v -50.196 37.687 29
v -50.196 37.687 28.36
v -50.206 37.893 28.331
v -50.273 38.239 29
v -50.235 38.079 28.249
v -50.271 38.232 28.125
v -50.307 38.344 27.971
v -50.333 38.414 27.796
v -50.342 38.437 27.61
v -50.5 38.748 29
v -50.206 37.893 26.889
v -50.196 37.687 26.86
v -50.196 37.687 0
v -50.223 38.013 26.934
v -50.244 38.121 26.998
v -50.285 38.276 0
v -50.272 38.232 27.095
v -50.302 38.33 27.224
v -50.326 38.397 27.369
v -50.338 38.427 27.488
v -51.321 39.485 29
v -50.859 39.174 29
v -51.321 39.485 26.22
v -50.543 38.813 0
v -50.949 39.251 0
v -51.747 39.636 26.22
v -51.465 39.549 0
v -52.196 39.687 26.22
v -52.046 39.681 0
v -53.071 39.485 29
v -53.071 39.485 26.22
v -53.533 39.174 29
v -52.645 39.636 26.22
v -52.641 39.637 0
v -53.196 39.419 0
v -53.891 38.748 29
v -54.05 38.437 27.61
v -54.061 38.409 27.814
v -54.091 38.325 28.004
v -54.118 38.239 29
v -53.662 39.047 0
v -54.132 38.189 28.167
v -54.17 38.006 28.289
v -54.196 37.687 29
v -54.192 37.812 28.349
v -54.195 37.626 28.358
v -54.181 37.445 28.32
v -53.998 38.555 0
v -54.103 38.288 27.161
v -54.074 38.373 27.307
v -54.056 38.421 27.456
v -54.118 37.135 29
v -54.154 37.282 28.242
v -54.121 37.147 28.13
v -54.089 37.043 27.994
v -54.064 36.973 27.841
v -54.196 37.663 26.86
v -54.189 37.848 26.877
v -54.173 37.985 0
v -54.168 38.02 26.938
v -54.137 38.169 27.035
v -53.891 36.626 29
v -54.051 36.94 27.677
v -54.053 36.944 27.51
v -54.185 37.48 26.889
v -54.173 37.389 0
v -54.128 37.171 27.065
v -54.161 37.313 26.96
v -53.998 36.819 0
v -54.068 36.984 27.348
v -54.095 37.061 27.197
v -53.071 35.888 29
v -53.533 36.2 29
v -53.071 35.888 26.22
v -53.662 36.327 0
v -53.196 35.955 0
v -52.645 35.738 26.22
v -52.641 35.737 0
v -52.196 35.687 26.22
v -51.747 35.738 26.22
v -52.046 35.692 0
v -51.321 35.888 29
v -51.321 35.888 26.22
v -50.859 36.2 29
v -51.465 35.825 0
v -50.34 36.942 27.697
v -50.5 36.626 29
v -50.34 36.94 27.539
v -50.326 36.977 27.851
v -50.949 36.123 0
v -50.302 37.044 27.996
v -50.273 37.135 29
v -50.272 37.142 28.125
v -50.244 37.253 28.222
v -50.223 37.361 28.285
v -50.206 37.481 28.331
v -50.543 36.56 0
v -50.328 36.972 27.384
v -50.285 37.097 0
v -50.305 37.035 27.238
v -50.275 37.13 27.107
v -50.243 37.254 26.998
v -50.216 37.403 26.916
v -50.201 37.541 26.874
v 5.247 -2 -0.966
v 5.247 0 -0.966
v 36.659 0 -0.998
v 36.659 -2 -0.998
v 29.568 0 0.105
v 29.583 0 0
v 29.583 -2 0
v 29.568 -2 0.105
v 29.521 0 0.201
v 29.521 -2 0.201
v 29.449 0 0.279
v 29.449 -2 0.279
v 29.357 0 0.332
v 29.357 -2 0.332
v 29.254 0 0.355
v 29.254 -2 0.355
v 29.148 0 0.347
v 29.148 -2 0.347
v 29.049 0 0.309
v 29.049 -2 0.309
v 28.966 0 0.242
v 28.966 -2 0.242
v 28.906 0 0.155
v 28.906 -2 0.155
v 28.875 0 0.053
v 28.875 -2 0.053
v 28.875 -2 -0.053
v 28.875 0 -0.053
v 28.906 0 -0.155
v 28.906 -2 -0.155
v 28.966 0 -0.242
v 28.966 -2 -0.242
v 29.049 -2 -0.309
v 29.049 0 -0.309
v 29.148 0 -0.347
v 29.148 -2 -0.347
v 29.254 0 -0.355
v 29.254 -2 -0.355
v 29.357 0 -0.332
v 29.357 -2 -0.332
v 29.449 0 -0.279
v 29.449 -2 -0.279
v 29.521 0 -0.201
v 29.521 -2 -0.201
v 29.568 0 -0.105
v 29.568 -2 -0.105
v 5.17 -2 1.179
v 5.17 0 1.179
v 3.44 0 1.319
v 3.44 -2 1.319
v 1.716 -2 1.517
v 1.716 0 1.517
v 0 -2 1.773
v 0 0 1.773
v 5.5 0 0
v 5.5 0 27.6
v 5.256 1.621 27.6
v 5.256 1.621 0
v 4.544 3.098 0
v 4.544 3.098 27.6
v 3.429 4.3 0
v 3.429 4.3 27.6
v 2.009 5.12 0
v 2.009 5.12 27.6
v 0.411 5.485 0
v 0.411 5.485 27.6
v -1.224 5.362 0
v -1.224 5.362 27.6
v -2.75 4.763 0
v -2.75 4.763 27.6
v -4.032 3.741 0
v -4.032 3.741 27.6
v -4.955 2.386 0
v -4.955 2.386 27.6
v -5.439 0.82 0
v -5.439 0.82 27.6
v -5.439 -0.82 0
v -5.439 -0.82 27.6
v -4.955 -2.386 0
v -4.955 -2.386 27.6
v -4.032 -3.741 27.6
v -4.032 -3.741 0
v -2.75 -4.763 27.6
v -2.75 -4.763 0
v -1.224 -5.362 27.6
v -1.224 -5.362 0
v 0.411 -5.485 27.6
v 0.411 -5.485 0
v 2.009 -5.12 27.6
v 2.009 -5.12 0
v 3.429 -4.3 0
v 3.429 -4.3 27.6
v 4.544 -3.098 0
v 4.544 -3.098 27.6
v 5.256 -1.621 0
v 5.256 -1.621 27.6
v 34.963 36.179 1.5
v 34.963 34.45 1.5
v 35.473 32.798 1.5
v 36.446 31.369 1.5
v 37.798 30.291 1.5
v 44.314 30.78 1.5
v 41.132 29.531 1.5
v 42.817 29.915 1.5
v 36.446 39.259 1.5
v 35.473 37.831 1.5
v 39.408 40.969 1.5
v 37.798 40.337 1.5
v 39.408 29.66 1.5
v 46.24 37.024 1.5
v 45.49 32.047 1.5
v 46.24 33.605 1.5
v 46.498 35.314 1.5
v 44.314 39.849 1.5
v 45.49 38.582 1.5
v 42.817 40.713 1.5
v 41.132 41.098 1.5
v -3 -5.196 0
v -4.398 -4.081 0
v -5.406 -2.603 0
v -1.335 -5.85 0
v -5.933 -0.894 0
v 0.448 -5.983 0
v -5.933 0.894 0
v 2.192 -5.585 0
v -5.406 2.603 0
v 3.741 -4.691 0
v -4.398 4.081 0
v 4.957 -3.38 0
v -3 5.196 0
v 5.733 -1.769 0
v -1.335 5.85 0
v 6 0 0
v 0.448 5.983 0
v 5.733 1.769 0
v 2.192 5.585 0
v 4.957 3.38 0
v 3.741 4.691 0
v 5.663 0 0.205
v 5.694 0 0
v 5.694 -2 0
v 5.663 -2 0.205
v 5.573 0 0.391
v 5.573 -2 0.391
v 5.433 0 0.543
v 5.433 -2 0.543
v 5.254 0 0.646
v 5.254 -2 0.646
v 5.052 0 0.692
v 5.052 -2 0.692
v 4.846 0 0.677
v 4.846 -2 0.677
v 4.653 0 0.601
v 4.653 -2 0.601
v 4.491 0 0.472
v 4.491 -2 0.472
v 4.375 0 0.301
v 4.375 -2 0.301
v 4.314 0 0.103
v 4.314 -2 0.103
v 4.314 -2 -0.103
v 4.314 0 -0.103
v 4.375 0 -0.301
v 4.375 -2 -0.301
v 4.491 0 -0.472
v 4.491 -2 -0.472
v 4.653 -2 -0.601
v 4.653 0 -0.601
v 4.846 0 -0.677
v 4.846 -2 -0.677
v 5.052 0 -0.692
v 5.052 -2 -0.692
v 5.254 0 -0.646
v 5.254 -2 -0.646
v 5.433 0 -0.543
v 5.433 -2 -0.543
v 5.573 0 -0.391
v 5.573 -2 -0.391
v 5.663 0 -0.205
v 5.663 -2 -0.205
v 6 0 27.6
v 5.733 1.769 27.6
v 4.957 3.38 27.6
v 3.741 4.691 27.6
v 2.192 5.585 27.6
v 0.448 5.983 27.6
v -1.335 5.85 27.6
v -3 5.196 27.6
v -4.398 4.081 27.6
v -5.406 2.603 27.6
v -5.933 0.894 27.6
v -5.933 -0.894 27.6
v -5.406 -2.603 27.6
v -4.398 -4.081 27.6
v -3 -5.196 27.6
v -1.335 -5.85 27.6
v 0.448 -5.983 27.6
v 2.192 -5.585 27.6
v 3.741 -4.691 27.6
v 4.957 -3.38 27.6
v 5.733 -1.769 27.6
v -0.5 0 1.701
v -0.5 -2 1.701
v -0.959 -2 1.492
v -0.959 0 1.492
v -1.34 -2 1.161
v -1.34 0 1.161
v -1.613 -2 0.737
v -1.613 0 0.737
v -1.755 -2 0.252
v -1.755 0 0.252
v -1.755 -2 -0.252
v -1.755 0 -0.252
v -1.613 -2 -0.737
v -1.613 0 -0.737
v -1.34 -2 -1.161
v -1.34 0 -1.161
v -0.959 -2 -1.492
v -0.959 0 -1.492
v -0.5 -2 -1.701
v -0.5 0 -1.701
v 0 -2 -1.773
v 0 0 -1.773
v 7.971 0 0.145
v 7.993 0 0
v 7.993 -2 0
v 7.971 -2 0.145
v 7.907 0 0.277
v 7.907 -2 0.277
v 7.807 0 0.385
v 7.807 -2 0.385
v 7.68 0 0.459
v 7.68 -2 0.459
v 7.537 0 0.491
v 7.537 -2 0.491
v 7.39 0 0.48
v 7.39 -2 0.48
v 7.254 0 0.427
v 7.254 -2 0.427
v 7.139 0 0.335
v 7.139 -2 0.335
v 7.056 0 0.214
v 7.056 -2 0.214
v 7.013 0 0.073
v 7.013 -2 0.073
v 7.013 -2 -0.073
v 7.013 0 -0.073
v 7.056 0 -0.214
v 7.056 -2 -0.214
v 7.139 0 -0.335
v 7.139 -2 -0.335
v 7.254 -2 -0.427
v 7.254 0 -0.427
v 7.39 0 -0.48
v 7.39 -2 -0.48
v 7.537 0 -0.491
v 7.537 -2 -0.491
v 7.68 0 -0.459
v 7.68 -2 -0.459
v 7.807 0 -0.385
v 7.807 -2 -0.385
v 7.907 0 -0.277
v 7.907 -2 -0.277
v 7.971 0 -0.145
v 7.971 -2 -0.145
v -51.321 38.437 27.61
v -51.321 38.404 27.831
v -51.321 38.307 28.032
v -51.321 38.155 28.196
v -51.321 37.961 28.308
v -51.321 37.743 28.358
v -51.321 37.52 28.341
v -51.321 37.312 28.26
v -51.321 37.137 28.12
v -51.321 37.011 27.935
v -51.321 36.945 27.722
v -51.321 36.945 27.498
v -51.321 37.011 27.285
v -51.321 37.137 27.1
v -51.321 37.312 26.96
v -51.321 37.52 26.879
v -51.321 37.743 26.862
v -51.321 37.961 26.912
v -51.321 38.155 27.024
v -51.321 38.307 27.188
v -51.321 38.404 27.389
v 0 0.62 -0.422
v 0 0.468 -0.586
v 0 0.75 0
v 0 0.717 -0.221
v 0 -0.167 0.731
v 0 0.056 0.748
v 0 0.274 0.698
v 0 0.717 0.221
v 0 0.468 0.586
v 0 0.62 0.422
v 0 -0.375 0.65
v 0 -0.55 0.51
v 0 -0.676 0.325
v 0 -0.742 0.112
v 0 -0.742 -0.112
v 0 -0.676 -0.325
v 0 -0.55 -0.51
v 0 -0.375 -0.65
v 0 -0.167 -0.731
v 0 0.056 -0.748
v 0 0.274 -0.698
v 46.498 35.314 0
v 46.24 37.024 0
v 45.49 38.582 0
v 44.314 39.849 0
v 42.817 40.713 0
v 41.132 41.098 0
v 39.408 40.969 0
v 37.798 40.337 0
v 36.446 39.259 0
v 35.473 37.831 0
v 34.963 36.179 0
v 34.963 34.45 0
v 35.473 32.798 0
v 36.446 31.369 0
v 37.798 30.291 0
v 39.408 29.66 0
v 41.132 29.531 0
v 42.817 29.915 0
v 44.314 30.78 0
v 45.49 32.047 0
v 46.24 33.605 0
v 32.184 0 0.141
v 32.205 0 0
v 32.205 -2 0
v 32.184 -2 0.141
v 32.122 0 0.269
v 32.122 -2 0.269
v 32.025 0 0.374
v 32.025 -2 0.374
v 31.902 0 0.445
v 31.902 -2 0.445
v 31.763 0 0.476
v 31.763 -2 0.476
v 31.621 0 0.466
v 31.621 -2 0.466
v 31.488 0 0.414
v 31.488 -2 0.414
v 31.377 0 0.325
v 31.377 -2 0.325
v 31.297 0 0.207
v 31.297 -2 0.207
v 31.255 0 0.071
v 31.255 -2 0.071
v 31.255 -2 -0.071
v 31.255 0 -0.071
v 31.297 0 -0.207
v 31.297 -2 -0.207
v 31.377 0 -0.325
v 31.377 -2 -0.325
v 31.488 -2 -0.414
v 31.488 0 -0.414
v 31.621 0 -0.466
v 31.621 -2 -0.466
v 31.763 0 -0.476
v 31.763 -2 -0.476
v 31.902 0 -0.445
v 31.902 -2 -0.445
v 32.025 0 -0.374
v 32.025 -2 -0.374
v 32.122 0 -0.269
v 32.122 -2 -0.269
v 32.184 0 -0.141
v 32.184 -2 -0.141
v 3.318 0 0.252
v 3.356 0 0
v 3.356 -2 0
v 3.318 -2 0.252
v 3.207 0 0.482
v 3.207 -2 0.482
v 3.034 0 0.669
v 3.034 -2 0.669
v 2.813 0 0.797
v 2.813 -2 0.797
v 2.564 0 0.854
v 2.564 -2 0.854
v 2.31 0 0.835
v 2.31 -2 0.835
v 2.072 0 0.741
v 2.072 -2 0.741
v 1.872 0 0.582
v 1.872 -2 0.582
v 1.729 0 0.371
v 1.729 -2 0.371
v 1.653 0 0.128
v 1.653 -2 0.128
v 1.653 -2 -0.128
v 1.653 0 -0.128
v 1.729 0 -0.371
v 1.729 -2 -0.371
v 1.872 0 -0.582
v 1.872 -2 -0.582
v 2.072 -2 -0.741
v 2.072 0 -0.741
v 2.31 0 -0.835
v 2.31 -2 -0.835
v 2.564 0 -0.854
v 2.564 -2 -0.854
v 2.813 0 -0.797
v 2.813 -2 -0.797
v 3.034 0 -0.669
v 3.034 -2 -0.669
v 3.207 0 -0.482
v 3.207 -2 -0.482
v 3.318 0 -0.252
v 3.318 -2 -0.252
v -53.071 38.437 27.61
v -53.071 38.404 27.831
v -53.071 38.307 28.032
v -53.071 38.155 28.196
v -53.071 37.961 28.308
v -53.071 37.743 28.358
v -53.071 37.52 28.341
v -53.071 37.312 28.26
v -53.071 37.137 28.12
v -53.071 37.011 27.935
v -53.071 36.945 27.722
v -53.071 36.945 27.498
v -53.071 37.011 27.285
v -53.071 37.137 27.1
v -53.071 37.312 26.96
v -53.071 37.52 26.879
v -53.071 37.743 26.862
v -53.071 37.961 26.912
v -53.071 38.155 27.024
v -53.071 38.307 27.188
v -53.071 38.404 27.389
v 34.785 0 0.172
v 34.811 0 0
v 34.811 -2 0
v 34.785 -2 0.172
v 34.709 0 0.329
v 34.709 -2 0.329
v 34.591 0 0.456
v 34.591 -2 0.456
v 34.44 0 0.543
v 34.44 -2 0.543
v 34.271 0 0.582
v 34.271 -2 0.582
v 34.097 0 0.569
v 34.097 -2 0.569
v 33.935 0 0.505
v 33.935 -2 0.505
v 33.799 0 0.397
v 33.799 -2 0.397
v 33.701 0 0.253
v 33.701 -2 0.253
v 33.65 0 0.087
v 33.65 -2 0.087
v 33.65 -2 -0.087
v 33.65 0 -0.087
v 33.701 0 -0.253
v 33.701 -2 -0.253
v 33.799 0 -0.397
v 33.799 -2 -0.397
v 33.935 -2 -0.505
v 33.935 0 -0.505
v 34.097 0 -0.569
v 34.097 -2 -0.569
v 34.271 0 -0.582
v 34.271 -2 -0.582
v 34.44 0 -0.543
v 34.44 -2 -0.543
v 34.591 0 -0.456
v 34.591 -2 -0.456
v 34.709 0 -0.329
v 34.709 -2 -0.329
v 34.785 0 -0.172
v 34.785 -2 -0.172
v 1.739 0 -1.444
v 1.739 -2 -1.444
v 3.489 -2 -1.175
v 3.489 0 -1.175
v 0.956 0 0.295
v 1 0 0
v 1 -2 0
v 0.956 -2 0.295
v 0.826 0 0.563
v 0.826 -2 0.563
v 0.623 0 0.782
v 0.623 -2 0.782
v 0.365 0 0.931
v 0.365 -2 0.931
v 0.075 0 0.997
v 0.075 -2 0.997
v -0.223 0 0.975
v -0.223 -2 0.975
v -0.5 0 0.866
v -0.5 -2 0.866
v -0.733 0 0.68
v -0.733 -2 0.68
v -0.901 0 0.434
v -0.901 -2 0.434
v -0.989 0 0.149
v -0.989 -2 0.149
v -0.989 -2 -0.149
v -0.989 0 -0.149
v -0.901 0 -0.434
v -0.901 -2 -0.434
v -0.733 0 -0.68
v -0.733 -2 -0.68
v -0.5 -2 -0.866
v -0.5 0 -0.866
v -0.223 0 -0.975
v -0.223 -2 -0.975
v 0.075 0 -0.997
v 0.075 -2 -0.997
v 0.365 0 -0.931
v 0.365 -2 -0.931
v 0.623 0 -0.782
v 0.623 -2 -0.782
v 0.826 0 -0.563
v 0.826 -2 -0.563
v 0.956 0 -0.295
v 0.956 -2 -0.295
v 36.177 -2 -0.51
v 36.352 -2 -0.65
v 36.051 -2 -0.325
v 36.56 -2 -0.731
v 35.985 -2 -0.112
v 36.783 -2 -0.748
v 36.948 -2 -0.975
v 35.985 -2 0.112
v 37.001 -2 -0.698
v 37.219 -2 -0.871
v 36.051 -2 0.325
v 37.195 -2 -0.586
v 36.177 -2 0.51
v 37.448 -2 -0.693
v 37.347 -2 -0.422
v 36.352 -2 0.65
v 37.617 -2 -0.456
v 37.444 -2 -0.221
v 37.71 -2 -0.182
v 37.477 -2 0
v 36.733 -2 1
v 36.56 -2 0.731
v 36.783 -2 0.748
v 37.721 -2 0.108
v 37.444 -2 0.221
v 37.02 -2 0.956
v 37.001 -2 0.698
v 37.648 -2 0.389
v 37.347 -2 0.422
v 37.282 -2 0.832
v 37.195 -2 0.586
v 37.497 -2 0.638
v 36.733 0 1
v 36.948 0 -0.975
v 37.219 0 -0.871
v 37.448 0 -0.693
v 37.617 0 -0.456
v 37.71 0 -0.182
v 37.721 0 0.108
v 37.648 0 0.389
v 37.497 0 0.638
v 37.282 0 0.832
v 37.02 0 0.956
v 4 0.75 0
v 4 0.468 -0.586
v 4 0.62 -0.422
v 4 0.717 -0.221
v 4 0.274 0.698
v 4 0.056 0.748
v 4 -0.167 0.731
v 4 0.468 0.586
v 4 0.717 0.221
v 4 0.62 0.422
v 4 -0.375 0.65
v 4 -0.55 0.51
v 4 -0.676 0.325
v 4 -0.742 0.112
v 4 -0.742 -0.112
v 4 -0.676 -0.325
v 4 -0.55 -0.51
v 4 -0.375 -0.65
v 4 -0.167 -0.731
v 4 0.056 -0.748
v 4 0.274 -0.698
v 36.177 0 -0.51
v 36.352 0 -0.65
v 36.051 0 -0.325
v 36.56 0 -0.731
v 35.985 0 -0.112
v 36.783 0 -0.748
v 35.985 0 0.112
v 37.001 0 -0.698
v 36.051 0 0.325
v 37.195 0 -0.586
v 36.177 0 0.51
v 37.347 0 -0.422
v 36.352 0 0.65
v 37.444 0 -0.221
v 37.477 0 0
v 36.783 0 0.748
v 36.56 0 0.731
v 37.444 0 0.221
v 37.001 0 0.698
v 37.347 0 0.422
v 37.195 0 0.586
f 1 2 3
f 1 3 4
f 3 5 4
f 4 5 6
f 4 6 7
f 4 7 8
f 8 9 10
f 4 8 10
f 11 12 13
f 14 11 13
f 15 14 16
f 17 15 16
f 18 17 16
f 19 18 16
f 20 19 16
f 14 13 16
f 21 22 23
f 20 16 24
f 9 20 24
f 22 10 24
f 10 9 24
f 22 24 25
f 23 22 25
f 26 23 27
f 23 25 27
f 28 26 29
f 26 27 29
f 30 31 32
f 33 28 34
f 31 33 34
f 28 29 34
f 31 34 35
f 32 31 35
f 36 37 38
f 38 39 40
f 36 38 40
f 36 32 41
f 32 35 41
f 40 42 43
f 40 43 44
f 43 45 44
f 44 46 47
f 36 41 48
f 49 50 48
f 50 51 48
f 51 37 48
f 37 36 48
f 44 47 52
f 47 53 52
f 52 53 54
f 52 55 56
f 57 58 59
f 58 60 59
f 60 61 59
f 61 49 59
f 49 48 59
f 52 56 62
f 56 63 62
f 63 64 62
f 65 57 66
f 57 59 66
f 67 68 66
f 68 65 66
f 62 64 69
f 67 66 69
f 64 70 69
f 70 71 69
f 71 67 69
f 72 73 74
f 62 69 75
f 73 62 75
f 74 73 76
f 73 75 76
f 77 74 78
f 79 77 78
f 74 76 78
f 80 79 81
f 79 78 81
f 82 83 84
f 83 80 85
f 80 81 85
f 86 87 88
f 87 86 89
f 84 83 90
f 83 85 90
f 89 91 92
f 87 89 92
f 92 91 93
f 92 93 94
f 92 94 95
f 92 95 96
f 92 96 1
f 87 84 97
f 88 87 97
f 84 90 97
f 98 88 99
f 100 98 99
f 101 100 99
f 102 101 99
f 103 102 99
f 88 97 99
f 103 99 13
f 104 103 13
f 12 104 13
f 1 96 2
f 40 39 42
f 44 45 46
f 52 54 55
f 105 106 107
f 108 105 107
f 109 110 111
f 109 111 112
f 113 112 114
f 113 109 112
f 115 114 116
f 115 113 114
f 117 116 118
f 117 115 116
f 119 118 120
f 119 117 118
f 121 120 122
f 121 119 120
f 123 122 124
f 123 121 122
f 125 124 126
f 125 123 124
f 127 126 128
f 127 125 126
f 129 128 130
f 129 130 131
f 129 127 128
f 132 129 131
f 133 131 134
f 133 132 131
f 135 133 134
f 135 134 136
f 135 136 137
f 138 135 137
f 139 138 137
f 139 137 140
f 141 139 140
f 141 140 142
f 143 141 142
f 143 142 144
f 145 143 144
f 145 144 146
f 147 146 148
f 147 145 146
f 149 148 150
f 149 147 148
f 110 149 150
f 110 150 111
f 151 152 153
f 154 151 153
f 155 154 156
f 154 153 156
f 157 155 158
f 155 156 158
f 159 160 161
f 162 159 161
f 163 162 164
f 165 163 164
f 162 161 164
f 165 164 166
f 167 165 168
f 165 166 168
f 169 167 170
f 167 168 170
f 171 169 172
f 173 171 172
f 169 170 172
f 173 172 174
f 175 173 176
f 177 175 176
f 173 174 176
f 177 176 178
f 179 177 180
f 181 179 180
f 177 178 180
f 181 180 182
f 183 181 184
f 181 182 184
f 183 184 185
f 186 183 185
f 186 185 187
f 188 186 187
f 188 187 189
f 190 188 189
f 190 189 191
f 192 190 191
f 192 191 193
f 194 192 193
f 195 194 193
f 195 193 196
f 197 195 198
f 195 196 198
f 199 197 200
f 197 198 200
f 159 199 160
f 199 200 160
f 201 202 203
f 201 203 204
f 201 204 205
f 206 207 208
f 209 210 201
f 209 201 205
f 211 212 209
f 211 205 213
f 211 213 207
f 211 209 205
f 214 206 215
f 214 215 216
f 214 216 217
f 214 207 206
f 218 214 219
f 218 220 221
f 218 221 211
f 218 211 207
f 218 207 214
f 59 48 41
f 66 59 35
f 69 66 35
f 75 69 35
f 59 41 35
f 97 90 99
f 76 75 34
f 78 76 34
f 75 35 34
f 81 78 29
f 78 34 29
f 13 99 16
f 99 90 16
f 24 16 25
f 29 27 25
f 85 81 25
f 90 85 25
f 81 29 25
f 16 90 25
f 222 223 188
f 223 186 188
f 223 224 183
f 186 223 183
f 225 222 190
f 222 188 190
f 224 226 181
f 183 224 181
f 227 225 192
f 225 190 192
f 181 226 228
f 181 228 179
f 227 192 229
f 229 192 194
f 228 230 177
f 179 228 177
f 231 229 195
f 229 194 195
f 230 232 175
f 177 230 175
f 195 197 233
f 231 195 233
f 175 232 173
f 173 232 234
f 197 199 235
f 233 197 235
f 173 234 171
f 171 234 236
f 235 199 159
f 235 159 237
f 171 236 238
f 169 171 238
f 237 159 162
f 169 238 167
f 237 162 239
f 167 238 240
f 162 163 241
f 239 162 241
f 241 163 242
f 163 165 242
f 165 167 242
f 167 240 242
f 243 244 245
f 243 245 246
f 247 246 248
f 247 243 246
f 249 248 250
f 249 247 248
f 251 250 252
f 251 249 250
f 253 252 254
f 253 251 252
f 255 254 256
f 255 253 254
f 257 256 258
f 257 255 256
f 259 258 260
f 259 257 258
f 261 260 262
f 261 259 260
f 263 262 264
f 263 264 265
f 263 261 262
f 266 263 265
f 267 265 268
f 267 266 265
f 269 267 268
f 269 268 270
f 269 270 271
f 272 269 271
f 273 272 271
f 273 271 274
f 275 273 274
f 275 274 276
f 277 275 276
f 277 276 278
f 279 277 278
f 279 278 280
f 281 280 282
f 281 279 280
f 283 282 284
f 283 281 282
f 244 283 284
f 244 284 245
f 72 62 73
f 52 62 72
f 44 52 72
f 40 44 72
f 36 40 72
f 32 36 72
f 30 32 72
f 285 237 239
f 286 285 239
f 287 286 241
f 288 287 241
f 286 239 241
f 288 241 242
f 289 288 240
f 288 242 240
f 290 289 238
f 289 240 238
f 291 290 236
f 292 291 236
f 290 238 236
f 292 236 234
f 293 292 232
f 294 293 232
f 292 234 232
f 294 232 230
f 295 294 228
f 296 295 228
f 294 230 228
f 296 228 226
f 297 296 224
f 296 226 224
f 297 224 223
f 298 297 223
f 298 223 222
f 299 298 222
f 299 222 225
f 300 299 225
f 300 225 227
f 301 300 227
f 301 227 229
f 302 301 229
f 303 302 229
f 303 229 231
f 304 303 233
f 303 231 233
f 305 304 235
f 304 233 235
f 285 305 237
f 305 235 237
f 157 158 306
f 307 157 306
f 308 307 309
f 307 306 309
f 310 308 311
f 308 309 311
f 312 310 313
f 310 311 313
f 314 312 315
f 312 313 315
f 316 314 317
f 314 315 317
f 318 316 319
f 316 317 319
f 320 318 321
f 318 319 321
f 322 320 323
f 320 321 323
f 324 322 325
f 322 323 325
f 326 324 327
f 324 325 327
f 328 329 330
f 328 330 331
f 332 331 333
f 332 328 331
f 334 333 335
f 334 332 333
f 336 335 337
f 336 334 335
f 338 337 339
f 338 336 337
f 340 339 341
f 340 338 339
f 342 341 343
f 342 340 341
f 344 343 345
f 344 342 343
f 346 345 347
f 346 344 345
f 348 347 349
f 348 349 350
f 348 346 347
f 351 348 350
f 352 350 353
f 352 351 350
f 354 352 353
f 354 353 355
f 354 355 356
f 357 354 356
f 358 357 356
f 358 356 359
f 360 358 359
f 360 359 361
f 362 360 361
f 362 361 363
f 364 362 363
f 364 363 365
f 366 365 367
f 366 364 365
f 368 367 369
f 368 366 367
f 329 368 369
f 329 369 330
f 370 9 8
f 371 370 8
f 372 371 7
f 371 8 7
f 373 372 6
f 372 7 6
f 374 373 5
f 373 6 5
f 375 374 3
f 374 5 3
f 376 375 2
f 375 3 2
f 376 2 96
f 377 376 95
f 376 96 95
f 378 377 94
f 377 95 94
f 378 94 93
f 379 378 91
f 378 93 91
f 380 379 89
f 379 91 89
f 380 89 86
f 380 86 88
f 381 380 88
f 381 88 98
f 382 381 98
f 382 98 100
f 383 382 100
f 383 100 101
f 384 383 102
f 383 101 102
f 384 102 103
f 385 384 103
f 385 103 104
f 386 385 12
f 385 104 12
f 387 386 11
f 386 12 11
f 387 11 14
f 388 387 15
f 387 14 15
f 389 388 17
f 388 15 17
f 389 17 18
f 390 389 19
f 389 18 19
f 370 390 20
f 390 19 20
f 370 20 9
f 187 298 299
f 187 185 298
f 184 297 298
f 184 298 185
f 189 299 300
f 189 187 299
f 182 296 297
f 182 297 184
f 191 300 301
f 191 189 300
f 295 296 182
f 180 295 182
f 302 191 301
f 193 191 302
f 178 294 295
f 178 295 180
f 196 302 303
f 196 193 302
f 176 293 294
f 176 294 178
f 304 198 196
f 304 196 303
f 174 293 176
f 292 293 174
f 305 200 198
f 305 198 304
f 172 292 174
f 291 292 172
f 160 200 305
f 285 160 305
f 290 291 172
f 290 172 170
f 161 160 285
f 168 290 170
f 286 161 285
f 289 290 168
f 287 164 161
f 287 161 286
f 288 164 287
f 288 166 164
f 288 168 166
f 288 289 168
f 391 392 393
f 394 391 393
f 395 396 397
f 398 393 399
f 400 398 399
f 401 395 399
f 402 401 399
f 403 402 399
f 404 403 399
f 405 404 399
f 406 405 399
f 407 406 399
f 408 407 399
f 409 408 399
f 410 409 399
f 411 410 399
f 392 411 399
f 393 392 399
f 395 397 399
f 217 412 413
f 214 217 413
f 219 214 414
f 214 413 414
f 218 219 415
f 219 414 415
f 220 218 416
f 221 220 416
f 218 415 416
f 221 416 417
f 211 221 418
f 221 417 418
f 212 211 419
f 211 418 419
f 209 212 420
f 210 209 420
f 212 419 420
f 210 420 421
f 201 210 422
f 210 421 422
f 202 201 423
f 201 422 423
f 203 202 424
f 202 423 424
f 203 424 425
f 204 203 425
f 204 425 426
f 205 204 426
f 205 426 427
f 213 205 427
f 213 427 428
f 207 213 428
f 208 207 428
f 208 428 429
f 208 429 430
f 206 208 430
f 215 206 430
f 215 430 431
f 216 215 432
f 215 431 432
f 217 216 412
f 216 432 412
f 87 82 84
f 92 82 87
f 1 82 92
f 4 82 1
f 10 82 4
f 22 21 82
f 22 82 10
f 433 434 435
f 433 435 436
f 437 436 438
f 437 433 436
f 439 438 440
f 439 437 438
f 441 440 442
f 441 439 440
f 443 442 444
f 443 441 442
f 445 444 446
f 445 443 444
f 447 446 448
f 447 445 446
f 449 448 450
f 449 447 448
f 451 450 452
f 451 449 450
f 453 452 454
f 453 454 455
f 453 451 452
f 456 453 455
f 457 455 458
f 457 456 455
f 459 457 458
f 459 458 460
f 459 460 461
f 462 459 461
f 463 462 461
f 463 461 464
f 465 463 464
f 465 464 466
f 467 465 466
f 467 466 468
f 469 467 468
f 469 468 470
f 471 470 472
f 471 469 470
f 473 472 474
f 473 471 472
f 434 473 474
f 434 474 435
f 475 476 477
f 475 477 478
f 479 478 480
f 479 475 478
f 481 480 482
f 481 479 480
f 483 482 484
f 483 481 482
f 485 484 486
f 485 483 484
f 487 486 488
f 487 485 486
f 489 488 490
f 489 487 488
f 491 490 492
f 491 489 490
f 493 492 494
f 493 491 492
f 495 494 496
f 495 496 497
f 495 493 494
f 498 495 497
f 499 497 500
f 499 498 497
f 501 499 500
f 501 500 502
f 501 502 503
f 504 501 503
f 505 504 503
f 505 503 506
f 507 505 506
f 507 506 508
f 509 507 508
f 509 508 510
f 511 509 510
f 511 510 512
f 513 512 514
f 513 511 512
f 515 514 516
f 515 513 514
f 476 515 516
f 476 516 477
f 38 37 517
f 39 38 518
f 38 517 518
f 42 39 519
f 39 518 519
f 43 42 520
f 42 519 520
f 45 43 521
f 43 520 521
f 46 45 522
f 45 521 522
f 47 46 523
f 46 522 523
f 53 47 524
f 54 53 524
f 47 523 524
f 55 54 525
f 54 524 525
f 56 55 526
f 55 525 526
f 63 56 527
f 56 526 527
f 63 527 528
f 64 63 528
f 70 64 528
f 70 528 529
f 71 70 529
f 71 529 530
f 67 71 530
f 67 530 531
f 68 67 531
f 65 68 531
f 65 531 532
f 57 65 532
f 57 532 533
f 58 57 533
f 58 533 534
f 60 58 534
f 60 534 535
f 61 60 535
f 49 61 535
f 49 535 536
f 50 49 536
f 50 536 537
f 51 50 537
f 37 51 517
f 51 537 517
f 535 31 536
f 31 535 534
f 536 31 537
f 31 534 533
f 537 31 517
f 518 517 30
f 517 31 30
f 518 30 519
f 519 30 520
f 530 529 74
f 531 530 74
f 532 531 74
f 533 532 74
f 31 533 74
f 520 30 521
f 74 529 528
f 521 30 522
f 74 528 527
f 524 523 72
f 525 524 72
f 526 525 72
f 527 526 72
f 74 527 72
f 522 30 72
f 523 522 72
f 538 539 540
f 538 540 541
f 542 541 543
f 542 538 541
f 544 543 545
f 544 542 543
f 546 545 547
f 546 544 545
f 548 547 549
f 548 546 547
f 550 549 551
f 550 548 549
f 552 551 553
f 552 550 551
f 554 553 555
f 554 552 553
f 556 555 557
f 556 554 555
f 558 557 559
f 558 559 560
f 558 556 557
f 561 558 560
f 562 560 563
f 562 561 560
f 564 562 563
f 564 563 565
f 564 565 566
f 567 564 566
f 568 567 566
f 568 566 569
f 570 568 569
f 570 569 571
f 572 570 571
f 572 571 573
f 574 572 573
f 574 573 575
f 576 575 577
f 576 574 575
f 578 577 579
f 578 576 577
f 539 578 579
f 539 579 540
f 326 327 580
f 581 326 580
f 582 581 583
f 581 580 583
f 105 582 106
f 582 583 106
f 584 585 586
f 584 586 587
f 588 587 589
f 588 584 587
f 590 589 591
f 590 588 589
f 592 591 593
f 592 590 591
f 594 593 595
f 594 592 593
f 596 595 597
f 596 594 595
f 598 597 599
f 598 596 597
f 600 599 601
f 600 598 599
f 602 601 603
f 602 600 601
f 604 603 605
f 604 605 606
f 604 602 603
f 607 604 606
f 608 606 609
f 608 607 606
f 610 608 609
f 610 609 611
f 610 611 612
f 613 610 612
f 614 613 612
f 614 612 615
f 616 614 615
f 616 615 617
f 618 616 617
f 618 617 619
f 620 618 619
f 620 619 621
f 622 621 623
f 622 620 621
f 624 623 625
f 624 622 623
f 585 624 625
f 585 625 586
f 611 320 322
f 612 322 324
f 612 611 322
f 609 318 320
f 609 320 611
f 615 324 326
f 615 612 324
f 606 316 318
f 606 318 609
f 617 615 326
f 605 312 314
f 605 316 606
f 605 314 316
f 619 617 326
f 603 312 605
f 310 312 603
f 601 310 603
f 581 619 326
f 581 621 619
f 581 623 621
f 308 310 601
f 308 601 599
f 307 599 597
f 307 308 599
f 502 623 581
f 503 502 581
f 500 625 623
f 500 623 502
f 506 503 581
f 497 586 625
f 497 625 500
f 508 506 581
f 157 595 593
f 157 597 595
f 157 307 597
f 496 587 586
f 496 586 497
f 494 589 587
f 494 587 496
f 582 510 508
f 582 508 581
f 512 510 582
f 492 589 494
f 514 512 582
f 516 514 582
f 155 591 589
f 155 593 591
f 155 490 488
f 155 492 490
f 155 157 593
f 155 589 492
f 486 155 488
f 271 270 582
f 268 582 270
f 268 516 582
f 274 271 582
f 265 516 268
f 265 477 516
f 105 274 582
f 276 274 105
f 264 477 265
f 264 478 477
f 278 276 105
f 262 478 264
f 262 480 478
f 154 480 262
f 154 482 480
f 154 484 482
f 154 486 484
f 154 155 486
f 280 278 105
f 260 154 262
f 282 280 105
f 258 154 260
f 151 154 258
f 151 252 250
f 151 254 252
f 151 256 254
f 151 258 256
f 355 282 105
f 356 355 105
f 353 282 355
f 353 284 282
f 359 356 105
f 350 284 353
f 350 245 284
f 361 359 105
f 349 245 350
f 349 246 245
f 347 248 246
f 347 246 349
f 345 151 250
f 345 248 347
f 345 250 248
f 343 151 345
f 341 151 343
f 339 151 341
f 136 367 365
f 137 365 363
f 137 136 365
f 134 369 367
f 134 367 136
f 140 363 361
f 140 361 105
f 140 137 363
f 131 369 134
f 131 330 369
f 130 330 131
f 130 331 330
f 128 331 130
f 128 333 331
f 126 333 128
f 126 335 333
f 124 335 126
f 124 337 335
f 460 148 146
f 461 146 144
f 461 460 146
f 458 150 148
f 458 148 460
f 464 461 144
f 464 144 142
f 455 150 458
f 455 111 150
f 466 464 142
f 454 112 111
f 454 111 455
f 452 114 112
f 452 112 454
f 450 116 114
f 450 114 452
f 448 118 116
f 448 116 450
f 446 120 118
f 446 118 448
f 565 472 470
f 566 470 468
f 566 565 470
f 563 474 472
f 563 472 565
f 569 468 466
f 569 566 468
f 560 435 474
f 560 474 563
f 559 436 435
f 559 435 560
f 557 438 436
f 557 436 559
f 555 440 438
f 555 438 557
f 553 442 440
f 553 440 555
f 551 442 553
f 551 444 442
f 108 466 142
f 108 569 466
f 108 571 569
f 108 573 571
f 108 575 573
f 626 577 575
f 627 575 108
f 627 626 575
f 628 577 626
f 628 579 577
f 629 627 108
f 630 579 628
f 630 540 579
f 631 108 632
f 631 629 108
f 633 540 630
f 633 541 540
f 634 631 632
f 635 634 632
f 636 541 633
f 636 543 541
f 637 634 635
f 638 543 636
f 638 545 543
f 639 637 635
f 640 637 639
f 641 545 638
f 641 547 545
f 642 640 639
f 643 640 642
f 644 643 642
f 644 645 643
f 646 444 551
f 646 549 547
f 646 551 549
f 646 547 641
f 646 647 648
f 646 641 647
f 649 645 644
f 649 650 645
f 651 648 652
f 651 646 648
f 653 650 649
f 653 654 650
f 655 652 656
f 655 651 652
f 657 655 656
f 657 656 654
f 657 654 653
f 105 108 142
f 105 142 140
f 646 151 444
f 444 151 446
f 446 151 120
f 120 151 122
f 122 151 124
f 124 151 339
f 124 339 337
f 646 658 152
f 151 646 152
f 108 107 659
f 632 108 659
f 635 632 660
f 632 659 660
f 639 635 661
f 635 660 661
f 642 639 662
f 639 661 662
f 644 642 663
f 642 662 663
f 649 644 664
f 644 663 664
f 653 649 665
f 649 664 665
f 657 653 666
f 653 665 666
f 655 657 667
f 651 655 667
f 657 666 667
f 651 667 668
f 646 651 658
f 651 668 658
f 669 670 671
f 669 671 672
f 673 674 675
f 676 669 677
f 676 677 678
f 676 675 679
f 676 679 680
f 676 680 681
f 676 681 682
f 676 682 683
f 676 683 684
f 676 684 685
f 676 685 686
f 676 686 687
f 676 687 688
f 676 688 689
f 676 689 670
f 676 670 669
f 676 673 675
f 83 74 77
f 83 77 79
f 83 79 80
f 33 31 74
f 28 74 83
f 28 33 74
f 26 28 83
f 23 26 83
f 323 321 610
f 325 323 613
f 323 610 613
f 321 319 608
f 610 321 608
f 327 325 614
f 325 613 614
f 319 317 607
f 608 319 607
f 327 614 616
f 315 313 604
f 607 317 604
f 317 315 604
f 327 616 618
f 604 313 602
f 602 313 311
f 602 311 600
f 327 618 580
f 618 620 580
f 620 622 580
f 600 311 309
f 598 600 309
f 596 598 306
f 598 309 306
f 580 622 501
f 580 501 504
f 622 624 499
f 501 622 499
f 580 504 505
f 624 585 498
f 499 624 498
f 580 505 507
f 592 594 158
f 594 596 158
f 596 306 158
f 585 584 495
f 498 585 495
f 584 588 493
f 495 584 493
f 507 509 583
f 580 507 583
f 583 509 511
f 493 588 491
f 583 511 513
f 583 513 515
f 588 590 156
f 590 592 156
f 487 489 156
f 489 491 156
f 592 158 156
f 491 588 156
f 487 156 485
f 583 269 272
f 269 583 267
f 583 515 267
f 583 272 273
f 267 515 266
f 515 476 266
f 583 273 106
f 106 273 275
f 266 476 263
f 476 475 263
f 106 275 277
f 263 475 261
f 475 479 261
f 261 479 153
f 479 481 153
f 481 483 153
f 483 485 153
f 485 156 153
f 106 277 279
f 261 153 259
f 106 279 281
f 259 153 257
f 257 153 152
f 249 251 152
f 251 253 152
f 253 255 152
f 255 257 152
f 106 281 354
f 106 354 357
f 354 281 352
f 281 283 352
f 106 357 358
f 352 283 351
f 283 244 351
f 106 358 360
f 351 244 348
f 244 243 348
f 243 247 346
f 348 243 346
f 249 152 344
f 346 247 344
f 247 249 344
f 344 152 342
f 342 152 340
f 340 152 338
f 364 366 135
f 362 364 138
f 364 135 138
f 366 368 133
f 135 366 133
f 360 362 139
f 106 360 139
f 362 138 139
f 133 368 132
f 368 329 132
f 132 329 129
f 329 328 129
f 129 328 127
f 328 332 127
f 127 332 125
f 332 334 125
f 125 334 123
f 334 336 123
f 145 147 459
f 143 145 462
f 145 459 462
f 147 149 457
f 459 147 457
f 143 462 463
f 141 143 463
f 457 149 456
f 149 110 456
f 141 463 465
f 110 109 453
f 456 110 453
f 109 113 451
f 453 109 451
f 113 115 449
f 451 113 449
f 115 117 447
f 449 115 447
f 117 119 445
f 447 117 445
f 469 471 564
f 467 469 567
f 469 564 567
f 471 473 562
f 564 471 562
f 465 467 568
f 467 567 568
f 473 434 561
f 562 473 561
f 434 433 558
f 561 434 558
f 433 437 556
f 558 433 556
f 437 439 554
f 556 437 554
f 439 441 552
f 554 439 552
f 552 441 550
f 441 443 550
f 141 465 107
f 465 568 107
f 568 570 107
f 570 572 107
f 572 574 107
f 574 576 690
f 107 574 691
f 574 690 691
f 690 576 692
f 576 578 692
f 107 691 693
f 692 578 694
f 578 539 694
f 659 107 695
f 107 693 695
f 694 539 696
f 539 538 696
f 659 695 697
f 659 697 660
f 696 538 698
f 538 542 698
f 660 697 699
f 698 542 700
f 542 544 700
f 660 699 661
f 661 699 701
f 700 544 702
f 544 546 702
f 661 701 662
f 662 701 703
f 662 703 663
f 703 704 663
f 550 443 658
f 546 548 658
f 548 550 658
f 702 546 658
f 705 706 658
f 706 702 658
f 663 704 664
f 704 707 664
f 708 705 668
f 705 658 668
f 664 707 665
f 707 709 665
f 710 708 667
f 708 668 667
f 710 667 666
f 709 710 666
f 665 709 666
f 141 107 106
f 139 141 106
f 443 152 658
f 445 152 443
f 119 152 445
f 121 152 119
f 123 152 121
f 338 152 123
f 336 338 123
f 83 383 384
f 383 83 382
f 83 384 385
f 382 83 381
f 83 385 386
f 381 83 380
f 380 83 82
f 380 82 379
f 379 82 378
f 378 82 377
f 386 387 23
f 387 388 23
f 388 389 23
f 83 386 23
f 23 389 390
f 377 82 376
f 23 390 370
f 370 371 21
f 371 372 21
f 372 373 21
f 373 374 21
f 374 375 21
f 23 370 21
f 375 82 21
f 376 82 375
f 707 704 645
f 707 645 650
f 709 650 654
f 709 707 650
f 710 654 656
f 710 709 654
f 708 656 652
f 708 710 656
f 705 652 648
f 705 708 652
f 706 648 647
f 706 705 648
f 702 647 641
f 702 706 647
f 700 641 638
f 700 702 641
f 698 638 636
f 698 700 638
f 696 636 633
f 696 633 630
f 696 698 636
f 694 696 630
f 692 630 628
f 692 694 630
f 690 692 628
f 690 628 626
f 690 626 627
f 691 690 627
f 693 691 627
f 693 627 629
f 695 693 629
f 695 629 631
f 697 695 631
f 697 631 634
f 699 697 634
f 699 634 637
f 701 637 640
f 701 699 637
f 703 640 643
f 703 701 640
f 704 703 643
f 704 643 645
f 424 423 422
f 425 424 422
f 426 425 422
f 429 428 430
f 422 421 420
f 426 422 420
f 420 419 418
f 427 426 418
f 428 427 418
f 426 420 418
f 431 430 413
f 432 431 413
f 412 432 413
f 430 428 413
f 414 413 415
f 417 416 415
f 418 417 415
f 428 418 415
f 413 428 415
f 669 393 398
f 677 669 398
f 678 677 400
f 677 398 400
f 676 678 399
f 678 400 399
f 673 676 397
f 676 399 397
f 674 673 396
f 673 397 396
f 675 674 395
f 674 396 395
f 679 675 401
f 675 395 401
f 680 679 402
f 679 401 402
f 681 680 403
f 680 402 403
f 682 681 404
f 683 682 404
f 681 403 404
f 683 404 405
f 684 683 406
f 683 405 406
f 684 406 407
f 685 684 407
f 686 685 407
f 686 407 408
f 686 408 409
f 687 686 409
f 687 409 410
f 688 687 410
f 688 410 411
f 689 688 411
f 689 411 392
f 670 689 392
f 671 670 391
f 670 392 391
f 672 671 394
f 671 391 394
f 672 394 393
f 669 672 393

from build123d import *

# Parameters (mm, degrees)
F2_R      = 5.8
F3_DEPTH  = 1.5
F4_R      = 2
F5_DEPTH  = 29
F7_DEPTH  = 2.78
F0_R      = 6
F8_DEPTH  = 27.6
F9_R      = 5.5
F10_DEPTH = 27.6
F11_R     = 1
F11_R_2   = 0.8560808417
F11_R_3   = 0.6939243984
F11_R_4   = 0.4925851038
F11_R_5   = 0.3563326194
F11_R_6   = 0.4777702974
F11_R_7   = 0.5835711178
F11_R_8   = 0.75
F12_DEPTH = 2
F13_R     = 0.75
F14_DEPTH = 4
F15_R     = 0.75
F16_DEPTH = 54.1968321333


# Not quite as in the source:
# - the program builds the solid bodies; features that only make, move or delete a surface that nothing else refers to are left out


with BuildPart() as f3:
    # F2 (on Top) → F3 (new body)
    with BuildSketch(Plane.XY):
        with Locations((40.6981445849, 35.3143140674)):
            Circle(F2_R)
    extrude(amount=F3_DEPTH)


with BuildPart() as f5:
    # F4 (on Top) → F5 (new body)
    with BuildSketch(Plane.XY):
        with Locations((-52.1958321333, 37.6868508756)):
            Circle(F4_R)
    extrude(amount=F5_DEPTH)

    # F6 (on face) → F7 (cut)
    with BuildSketch(Plane.XY.offset(29)):
        with BuildLine():
            ThreePointArc((-51.3208321333, 39.4852876969), (-52.1958321333, 39.6868508756), (-53.0708321333, 39.4852876969))
            Line((-53.0708321333, 39.4852876969), (-53.0708321333, 35.8884140544))
            ThreePointArc((-53.0708321333, 35.8884140544), (-52.1958321333, 35.6868508756), (-51.3208321333, 35.8884140544))
            Line((-51.3208321333, 35.8884140544), (-51.3208321333, 39.4852876969))
        make_face()
    extrude(amount=-F7_DEPTH, mode=Mode.SUBTRACT)

    # F15 (on Right) → F16 (cut, through all)
    with BuildSketch(Plane.YZ):
        with Locations((37.6869140544, 27.61)):
            Circle(F15_R)
    extrude(amount=-F16_DEPTH, mode=Mode.SUBTRACT)


with BuildPart() as f8:
    # F0 (on Top) → F8 (new body)
    with BuildSketch(Plane.XY):
        Circle(F0_R)
    extrude(amount=F8_DEPTH)

    # F9 (on face) → F10 (cut)
    with BuildSketch(Plane.XY.offset(27.6)):
        Circle(F9_R)
    extrude(amount=-F10_DEPTH, mode=Mode.SUBTRACT)


with BuildPart() as f12:
    # F11 (on Front) → F12 (new body)
    with BuildSketch(Plane.XZ):
        with BuildLine():
            ThreePointArc((5.169888125, 1.1790200467), (2.5774452808, 1.4107420589), (0, 1.773))
            ThreePointArc((0, 1.773), (-1.773, 0), (0, -1.773))
            ThreePointArc((0, -1.773), (2.6128788251, -1.3020949548), (5.2465344779, -0.9663194069))
            Line((5.2465344779, -0.9663194069), (36.6588703738, -0.9976764776))
            ThreePointArc((36.6588703738, -0.9976764776), (37.7263182617, -0.0369189891), (36.7326722897, 0.9999839124))
            Line((36.7326722897, 0.9999839124), (5.169888125, 1.1790200467))
        make_face()
        Circle(F11_R, mode=Mode.SUBTRACT)
        with Locations((2.5, 0)):
            Circle(F11_R_2, mode=Mode.SUBTRACT)
        with Locations((5, 0)):
            Circle(F11_R_3, mode=Mode.SUBTRACT)
        with Locations((7.5, 0)):
            Circle(F11_R_4, mode=Mode.SUBTRACT)
        with Locations((29.227, 0)):
            Circle(F11_R_5, mode=Mode.SUBTRACT)
        with Locations((31.727, 0)):
            Circle(F11_R_6, mode=Mode.SUBTRACT)
        with Locations((34.227, 0)):
            Circle(F11_R_7, mode=Mode.SUBTRACT)
        with Locations((36.727, 0)):
            Circle(F11_R_8, mode=Mode.SUBTRACT)
    extrude(amount=F12_DEPTH)


with BuildPart() as f14:
    # F13 (on Right) → F14 (new body)
    with BuildSketch(Plane.YZ):
        Circle(F13_R)
    extrude(amount=F14_DEPTH)


solid = Compound([f3.part, f5.part, f8.part, f12.part, f14.part])
